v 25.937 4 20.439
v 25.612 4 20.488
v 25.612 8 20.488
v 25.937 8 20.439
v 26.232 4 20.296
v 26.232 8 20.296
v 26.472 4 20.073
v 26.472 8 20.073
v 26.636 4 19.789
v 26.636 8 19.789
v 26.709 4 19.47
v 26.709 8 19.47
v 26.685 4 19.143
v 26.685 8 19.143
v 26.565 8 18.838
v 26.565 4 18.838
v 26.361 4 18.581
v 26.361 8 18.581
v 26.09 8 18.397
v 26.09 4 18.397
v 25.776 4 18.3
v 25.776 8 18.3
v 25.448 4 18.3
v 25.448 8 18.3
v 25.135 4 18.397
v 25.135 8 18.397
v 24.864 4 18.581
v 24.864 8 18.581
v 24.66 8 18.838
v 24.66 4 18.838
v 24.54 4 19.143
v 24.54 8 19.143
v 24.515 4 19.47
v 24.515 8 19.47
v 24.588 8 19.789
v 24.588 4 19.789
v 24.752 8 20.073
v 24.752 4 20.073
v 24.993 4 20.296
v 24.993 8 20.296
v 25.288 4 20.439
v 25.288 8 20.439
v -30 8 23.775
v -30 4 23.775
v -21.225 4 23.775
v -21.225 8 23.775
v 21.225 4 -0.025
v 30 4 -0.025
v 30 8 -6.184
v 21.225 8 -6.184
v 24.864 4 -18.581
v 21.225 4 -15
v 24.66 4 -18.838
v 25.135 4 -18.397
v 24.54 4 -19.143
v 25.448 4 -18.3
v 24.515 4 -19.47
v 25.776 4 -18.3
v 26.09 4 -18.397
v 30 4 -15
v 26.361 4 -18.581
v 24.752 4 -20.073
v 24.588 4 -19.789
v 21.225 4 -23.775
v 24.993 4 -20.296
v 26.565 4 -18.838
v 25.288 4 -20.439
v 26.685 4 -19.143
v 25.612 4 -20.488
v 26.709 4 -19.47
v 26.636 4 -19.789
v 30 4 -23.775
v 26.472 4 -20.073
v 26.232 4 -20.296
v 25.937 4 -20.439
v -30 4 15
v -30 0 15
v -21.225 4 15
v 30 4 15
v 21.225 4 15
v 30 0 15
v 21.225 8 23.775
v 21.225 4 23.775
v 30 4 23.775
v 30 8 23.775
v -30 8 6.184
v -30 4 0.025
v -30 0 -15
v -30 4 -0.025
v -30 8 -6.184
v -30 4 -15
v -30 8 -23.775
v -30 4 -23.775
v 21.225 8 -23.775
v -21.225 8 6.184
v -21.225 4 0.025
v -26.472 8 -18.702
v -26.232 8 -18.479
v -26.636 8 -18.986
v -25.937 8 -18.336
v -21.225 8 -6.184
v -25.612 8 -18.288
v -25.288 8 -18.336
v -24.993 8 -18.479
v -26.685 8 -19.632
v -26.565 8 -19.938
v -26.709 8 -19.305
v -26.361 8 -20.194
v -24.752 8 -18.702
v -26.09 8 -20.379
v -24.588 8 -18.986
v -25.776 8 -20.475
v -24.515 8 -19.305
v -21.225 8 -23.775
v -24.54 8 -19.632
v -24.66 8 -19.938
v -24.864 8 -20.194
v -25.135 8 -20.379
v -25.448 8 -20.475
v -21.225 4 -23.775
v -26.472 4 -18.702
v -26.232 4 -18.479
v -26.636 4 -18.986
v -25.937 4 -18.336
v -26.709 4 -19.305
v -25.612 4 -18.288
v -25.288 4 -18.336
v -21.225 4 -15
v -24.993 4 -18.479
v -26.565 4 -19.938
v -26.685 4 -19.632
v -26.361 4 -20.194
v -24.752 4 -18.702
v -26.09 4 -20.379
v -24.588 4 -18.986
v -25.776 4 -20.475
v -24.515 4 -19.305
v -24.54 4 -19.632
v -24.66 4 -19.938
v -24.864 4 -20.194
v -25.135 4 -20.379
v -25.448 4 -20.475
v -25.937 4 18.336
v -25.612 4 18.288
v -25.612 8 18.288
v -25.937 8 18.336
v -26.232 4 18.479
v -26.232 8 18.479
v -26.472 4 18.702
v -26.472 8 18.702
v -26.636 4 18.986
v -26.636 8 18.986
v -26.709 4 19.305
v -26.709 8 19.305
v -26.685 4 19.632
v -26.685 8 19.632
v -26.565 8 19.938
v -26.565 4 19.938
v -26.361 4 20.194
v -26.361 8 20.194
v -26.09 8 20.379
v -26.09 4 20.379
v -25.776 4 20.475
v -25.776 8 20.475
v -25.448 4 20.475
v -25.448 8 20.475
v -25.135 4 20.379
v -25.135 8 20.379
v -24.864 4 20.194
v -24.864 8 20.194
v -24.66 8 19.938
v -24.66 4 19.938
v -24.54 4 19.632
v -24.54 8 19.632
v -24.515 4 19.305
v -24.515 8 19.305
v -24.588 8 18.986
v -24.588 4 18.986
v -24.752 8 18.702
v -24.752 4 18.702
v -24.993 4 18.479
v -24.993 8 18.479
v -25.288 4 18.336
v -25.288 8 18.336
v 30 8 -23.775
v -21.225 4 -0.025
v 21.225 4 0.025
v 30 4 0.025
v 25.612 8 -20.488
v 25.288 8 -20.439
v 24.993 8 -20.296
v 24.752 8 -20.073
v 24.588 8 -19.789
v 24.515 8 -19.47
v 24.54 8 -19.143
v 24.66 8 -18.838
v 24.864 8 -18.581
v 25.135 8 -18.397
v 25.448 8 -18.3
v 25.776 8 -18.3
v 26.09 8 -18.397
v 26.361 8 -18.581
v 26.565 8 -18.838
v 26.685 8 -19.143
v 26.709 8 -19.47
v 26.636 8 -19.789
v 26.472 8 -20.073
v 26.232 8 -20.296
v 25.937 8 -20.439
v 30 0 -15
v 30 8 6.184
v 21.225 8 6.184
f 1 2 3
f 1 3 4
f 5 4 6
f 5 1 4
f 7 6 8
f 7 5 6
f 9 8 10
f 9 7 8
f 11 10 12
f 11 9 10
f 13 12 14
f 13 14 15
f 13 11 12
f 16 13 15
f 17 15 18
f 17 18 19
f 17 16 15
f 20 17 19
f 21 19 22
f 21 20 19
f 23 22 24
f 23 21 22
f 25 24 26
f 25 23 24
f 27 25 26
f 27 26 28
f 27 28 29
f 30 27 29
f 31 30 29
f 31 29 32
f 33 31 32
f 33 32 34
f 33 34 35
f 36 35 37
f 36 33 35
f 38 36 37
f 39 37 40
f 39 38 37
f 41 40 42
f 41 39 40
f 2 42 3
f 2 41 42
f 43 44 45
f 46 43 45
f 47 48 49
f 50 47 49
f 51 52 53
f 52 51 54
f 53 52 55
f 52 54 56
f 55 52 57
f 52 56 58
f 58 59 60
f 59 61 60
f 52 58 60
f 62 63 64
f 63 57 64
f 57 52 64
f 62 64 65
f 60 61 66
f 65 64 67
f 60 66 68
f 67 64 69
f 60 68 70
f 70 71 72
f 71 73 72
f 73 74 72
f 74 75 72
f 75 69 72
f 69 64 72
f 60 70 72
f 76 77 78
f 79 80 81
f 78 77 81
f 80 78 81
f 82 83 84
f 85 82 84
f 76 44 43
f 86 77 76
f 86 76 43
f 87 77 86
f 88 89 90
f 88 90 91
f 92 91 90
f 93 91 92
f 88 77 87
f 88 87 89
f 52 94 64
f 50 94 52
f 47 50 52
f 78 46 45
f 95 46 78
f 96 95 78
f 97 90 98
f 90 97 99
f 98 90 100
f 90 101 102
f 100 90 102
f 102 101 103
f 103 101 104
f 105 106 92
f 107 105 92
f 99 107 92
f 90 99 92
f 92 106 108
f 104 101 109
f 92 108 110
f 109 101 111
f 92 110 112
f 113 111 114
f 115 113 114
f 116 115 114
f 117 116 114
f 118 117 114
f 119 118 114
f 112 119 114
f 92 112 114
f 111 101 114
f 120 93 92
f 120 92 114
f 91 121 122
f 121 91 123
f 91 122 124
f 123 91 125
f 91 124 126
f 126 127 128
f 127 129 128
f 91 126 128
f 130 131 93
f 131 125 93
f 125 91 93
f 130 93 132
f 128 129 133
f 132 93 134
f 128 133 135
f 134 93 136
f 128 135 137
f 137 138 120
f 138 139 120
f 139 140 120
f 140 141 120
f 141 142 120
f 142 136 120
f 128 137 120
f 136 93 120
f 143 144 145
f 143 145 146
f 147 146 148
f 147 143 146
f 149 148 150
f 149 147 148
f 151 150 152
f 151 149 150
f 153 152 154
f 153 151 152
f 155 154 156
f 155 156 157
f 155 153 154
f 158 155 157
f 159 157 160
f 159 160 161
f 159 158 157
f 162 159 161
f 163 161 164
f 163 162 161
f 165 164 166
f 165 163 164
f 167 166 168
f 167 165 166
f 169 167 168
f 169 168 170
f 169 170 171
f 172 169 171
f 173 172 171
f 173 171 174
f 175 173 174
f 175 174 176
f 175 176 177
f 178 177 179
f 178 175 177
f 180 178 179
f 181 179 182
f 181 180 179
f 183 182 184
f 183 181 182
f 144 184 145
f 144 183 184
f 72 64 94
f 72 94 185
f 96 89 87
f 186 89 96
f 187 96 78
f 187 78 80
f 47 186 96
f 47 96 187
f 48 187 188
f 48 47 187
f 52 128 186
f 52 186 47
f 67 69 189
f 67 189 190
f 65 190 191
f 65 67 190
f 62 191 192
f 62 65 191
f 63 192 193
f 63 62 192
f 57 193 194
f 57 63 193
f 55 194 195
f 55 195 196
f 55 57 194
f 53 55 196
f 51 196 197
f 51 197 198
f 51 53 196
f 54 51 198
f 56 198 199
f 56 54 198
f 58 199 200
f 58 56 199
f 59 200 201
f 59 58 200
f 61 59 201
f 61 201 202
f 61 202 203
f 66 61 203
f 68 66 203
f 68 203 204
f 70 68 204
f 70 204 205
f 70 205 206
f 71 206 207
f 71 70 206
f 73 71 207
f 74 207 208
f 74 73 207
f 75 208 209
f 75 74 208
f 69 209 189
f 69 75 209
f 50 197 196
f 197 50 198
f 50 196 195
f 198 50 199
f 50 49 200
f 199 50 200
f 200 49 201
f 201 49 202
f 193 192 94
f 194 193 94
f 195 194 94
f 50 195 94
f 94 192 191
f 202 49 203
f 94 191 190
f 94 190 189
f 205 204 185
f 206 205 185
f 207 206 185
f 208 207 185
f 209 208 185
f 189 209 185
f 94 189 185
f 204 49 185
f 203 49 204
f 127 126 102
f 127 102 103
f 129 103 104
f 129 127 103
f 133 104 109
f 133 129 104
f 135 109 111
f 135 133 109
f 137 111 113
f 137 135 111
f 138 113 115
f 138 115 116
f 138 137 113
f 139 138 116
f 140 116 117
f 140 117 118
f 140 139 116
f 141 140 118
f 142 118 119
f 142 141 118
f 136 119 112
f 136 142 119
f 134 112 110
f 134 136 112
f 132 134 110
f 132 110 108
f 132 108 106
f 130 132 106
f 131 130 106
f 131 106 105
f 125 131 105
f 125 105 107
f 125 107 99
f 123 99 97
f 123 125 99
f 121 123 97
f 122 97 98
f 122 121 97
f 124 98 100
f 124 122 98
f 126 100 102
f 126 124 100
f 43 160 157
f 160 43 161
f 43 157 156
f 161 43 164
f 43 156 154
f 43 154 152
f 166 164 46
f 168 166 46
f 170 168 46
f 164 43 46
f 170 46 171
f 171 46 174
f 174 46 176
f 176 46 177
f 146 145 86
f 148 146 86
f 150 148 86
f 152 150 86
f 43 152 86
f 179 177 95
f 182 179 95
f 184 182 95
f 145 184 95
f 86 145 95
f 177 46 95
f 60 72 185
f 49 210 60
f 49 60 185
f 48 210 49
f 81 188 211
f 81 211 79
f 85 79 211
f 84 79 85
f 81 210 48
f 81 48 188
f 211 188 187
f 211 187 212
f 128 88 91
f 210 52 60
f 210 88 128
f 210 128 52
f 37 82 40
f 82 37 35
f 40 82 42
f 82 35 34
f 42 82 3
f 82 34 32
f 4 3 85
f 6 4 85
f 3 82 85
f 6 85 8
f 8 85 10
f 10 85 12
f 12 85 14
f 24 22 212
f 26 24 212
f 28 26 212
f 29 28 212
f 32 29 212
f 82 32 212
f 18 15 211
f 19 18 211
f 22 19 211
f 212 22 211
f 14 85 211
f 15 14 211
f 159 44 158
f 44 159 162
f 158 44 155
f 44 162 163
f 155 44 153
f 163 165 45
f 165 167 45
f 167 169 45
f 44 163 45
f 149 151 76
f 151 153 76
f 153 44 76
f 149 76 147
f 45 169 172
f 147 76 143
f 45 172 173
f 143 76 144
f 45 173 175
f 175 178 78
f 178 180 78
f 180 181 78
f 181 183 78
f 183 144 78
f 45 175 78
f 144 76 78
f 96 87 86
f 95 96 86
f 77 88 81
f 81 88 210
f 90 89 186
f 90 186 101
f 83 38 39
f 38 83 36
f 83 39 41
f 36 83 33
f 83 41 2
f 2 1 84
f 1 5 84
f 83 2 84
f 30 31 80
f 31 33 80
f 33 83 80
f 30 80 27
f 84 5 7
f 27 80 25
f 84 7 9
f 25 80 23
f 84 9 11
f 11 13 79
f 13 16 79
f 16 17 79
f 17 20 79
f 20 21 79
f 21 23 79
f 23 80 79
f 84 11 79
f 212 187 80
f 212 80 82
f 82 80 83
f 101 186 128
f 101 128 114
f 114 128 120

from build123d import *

# Parameters (mm, degrees)
SKETCH1_W           = 60
SKETCH1_H           = 30
BOSS_EXTRUDE1_DEPTH = 4
SKETCH2_W           = 8.7752
SKETCH2_H           = 17.5504
SKETCH2_R           = 1.1
BOSS_EXTRUDE2_DEPTH = 4
CHAMFER1_SIZE       = 6.2
CHAMFER1_SIZE_2     = 4.026327078


with BuildPart() as part:
    # Sketch1 → Boss-Extrude1 (new body)
    with BuildSketch(Plane(origin=(0, 0, 0), x_dir=(1, 0, 0), z_dir=(0, 1, 0))):
        Rectangle(SKETCH1_W, SKETCH1_H)
    extrude(amount=BOSS_EXTRUDE1_DEPTH)

    # Sketch2 → Boss-Extrude2 (add)
    # profile 1 of 4: a face of its own
    with BuildSketch(Plane(origin=(0, 4, 0), x_dir=(1, 0, 0), z_dir=(0, 1, 0))):
        with Locations((-25.6124, 15)):
            Rectangle(SKETCH2_W, SKETCH2_H)
        with Locations(Location((-25.6124, 19.3876, 0), (0, 0, 270))):
            Circle(SKETCH2_R, mode=Mode.SUBTRACT)
    # profile 2 of 4: a face of its own
    with BuildSketch(Plane(origin=(0, 4, 0), x_dir=(1, 0, 0), z_dir=(0, 1, 0))):
        with Locations((-25.6124, -15)):
            Rectangle(SKETCH2_W, SKETCH2_H)
        with Locations(Location((-25.6124, -19.3876, 0), (0, 0, 90))):
            Circle(SKETCH2_R, mode=Mode.SUBTRACT)
    # profile 3 of 4: a face of its own
    with BuildSketch(Plane(origin=(0, 4, 0), x_dir=(1, 0, 0), z_dir=(0, 1, 0))):
        with Locations((25.6124, -15)):
            Rectangle(SKETCH2_W, SKETCH2_H)
        with Locations(Location((25.6124, -19.3876, 0), (0, 0, 270))):
            Circle(SKETCH2_R, mode=Mode.SUBTRACT)
    # profile 4 of 4: a face of its own
    with BuildSketch(Plane(origin=(0, 4, 0), x_dir=(1, 0, 0), z_dir=(0, 1, 0))):
        with Locations((25.6124, 15)):
            Rectangle(SKETCH2_W, SKETCH2_H)
        with Locations(Location((25.6124, 19.3876, 0), (0, 0, 90))):
            Circle(SKETCH2_R, mode=Mode.SUBTRACT)
    extrude(amount=BOSS_EXTRUDE2_DEPTH)

    # Chamfer1
    # the kernel refuses this chamfer: 6.2, 4.026327078 mm, written as the material it adds along each edge
    with BuildSketch(Plane(origin=(30, 4, -6.2248), x_dir=(0, -0.021073765466273358, 0.9997779235455605), z_dir=(-1, 0, 0))) as chamfer1_piece_1_section:
        Polygon((CHAMFER1_SIZE * 0.999777923546, CHAMFER1_SIZE * 0.0210737654663), (-CHAMFER1_SIZE_2 * 0.0210737654654, CHAMFER1_SIZE_2 * 0.999777923502), (0, 0), align=None)
    chamfer1_piece_1 = extrude(amount=8.7752, mode=Mode.PRIVATE)
    chamfer1_piece_1 = split(chamfer1_piece_1, bisect_by=Plane(origin=(25.6124, 8, -4.147892519), z_dir=(0, -1, 0)), keep=Keep.TOP, mode=Mode.PRIVATE)
    add(chamfer1_piece_1)
    with BuildSketch(Plane(origin=(30, 4, 6.2248), x_dir=(0, -0.021073765466273358, -0.9997779235455605), z_dir=(-1, 0, 0))) as chamfer1_piece_2_section:
        Polygon((CHAMFER1_SIZE * 0.999777923546, -CHAMFER1_SIZE * 0.0210737654663), (-CHAMFER1_SIZE_2 * 0.0210737654654, -CHAMFER1_SIZE_2 * 0.999777923502), (0, 0), align=None)
    chamfer1_piece_2 = extrude(amount=8.7752, mode=Mode.PRIVATE)
    chamfer1_piece_2 = split(chamfer1_piece_2, bisect_by=Plane(origin=(25.6124, 8, 4.147892519), z_dir=(0, -1, 0)), keep=Keep.TOP, mode=Mode.PRIVATE)
    add(chamfer1_piece_2)
    with BuildSketch(Plane(origin=(-30, 4, 6.2248), x_dir=(0, -0.021073765466273358, -0.9997779235455605), z_dir=(1, 0, 0))) as chamfer1_piece_3_section:
        Polygon((CHAMFER1_SIZE * 0.999777923546, CHAMFER1_SIZE * 0.0210737654663), (-CHAMFER1_SIZE_2 * 0.0210737654654, CHAMFER1_SIZE_2 * 0.999777923502), (0, 0), align=None)
    chamfer1_piece_3 = extrude(amount=8.7752, mode=Mode.PRIVATE)
    chamfer1_piece_3 = split(chamfer1_piece_3, bisect_by=Plane(origin=(-25.6124, 8, 4.147892519), z_dir=(0, -1, 0)), keep=Keep.TOP, mode=Mode.PRIVATE)
    add(chamfer1_piece_3)
    with BuildSketch(Plane(origin=(-30, 4, -6.2248), x_dir=(0, -0.021073765466273358, 0.9997779235455605), z_dir=(1, 0, 0))) as chamfer1_piece_4_section:
        Polygon((CHAMFER1_SIZE * 0.999777923546, -CHAMFER1_SIZE * 0.0210737654663), (-CHAMFER1_SIZE_2 * 0.0210737654654, -CHAMFER1_SIZE_2 * 0.999777923502), (0, 0), align=None)
    chamfer1_piece_4 = extrude(amount=8.7752, mode=Mode.PRIVATE)
    chamfer1_piece_4 = split(chamfer1_piece_4, bisect_by=Plane(origin=(-25.6124, 8, -4.147892519), z_dir=(0, -1, 0)), keep=Keep.TOP, mode=Mode.PRIVATE)
    add(chamfer1_piece_4)


solid = part.part
